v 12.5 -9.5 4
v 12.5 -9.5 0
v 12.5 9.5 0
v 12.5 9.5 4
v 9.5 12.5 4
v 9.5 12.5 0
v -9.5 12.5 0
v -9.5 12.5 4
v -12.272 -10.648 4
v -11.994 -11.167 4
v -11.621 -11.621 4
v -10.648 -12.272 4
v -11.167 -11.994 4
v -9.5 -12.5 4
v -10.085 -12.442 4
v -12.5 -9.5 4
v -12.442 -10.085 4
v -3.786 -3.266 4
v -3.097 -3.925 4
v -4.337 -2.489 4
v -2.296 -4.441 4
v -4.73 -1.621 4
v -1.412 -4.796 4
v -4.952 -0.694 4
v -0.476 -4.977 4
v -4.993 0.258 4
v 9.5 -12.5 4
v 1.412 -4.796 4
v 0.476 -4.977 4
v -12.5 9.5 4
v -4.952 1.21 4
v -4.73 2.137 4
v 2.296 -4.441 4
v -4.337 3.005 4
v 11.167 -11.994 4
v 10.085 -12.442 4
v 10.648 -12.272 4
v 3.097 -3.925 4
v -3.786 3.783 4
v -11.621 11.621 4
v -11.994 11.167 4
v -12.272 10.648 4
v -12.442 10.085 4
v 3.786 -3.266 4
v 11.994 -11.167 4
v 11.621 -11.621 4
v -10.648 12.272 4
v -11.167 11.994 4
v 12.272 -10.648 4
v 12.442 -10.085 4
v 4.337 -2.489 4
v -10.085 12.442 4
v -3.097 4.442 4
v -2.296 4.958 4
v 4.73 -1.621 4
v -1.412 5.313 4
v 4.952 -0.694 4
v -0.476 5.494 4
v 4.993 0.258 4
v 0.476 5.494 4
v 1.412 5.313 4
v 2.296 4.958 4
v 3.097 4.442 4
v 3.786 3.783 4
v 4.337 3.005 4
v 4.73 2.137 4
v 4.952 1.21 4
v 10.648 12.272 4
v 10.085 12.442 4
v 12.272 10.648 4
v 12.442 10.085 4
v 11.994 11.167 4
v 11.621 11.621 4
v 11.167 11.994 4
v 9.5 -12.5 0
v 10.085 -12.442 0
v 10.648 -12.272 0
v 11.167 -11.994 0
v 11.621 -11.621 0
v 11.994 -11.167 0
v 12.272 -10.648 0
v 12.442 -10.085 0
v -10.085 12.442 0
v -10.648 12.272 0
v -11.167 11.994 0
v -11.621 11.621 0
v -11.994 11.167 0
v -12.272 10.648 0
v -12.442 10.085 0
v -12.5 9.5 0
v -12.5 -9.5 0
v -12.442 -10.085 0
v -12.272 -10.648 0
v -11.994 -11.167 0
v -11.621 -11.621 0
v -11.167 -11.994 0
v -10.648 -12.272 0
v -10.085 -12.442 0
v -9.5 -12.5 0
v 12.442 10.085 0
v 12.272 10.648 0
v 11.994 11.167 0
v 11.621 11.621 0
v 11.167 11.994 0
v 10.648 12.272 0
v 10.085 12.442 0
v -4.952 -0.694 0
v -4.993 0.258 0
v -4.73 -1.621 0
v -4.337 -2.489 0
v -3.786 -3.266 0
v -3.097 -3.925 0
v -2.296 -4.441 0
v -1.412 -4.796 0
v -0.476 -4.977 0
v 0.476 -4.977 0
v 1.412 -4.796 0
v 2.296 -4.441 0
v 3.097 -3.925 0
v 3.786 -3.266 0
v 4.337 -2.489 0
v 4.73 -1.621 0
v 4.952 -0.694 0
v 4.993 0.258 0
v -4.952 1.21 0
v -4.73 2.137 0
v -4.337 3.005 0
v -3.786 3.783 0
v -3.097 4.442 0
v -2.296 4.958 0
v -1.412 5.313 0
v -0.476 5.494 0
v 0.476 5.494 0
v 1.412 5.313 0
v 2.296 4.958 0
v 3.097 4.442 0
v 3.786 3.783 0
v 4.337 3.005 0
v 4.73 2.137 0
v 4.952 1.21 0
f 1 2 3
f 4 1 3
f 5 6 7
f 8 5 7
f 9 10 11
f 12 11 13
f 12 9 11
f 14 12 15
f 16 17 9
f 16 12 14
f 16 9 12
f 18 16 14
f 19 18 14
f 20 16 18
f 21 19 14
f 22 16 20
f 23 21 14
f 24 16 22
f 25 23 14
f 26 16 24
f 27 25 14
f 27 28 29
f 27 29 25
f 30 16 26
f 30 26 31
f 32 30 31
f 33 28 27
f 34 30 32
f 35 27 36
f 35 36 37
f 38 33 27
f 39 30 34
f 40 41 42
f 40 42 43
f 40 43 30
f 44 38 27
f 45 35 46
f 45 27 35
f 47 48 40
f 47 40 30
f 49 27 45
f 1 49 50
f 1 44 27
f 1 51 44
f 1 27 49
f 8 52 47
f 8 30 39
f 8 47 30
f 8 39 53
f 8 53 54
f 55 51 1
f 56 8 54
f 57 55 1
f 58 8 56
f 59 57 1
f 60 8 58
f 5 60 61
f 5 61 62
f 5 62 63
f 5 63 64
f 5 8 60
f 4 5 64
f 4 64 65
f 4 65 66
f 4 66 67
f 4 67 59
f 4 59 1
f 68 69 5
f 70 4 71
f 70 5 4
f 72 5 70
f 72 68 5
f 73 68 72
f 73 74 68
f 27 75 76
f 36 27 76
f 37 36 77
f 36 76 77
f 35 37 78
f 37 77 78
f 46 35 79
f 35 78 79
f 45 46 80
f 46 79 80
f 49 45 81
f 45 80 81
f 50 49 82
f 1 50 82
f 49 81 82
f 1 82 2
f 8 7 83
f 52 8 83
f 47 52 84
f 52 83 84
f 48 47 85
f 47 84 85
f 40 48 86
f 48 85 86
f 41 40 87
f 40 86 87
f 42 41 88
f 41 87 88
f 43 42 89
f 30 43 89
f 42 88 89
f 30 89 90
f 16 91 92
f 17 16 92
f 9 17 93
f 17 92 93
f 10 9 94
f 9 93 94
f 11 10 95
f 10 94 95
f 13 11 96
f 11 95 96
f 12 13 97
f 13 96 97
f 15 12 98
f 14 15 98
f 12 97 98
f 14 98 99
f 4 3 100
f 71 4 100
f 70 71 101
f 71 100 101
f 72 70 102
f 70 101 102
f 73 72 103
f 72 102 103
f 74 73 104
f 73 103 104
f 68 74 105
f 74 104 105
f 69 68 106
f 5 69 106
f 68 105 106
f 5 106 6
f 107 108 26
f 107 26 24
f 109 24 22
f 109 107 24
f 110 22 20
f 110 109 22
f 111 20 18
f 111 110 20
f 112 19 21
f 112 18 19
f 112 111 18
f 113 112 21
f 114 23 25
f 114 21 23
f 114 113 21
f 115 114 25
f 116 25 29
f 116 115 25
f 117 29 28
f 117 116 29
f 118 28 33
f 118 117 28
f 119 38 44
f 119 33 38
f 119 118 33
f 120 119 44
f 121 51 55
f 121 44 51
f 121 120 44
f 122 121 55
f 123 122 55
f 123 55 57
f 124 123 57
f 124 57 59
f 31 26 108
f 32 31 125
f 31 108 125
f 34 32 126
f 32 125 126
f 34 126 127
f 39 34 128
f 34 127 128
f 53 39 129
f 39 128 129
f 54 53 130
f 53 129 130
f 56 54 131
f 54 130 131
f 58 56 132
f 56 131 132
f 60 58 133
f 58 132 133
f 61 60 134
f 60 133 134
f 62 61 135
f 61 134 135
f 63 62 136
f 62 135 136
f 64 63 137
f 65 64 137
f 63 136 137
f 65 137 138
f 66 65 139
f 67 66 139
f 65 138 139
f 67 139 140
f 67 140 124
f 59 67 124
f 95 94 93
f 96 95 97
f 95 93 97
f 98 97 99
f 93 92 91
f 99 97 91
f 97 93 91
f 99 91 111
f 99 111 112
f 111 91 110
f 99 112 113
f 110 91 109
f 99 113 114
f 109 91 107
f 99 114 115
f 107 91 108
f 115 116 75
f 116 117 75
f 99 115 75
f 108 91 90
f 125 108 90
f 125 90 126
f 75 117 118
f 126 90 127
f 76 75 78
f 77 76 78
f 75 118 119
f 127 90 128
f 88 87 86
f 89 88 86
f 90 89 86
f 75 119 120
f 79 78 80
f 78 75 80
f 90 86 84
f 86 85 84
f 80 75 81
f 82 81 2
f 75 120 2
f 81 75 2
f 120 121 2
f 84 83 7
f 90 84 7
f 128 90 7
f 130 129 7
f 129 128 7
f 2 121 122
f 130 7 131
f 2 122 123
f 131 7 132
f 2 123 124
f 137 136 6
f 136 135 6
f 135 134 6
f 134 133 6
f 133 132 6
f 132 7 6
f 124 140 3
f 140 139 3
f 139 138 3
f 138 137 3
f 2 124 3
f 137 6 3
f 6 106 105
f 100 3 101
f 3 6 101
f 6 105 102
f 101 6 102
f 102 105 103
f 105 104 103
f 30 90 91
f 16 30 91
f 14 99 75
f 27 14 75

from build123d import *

# Parameters (mm, degrees)
ESQUISSE1_R          = 5
BOSS_EXTRU_1_DEPTH   = 4
D_GAGEMENT_M82_D     = 10
D_GAGEMENT_M82_DEPTH = 222.5
D_GAGEMENT_M82_TIP   = 3.004303095


with BuildPart() as part:
    # Esquisse1 → Boss.-Extru.1 (new body)
    with BuildSketch(Plane.XY):
        with BuildLine():
            Line((-9.5, -12.5), (9.5, -12.5))
            ThreePointArc((9.5, -12.5), (11.621320344, -11.621320344), (12.5, -9.5))
            Line((12.5, -9.5), (12.5, 9.5))
            ThreePointArc((12.5, 9.5), (11.621320344, 11.621320344), (9.5, 12.5))
            Line((9.5, 12.5), (-9.5, 12.5))
            ThreePointArc((-9.5, 12.5), (-11.621320344, 11.621320344), (-12.5, 9.5))
            Line((-12.5, 9.5), (-12.5, -9.5))
            ThreePointArc((-12.5, -9.5), (-11.621320344, -11.621320344), (-9.5, -12.5))
        make_face()
        Circle(ESQUISSE1_R, mode=Mode.SUBTRACT)
    extrude(amount=BOSS_EXTRU_1_DEPTH)

    # Dégagement M82
    with Locations(Plane(origin=(0, -679.483503367, 39), x_dir=(1, 0, 0), z_dir=(0, 0, 1))):
        with Locations((0, 680), (0, 580), (0, 480)):
            Hole(D_GAGEMENT_M82_D / 2, depth=D_GAGEMENT_M82_DEPTH)
            with Locations((0, 0, -(D_GAGEMENT_M82_DEPTH + D_GAGEMENT_M82_TIP / 2))):  # 118° drill point
                Cone(0, D_GAGEMENT_M82_D / 2, D_GAGEMENT_M82_TIP, mode=Mode.SUBTRACT)


solid = part.part
